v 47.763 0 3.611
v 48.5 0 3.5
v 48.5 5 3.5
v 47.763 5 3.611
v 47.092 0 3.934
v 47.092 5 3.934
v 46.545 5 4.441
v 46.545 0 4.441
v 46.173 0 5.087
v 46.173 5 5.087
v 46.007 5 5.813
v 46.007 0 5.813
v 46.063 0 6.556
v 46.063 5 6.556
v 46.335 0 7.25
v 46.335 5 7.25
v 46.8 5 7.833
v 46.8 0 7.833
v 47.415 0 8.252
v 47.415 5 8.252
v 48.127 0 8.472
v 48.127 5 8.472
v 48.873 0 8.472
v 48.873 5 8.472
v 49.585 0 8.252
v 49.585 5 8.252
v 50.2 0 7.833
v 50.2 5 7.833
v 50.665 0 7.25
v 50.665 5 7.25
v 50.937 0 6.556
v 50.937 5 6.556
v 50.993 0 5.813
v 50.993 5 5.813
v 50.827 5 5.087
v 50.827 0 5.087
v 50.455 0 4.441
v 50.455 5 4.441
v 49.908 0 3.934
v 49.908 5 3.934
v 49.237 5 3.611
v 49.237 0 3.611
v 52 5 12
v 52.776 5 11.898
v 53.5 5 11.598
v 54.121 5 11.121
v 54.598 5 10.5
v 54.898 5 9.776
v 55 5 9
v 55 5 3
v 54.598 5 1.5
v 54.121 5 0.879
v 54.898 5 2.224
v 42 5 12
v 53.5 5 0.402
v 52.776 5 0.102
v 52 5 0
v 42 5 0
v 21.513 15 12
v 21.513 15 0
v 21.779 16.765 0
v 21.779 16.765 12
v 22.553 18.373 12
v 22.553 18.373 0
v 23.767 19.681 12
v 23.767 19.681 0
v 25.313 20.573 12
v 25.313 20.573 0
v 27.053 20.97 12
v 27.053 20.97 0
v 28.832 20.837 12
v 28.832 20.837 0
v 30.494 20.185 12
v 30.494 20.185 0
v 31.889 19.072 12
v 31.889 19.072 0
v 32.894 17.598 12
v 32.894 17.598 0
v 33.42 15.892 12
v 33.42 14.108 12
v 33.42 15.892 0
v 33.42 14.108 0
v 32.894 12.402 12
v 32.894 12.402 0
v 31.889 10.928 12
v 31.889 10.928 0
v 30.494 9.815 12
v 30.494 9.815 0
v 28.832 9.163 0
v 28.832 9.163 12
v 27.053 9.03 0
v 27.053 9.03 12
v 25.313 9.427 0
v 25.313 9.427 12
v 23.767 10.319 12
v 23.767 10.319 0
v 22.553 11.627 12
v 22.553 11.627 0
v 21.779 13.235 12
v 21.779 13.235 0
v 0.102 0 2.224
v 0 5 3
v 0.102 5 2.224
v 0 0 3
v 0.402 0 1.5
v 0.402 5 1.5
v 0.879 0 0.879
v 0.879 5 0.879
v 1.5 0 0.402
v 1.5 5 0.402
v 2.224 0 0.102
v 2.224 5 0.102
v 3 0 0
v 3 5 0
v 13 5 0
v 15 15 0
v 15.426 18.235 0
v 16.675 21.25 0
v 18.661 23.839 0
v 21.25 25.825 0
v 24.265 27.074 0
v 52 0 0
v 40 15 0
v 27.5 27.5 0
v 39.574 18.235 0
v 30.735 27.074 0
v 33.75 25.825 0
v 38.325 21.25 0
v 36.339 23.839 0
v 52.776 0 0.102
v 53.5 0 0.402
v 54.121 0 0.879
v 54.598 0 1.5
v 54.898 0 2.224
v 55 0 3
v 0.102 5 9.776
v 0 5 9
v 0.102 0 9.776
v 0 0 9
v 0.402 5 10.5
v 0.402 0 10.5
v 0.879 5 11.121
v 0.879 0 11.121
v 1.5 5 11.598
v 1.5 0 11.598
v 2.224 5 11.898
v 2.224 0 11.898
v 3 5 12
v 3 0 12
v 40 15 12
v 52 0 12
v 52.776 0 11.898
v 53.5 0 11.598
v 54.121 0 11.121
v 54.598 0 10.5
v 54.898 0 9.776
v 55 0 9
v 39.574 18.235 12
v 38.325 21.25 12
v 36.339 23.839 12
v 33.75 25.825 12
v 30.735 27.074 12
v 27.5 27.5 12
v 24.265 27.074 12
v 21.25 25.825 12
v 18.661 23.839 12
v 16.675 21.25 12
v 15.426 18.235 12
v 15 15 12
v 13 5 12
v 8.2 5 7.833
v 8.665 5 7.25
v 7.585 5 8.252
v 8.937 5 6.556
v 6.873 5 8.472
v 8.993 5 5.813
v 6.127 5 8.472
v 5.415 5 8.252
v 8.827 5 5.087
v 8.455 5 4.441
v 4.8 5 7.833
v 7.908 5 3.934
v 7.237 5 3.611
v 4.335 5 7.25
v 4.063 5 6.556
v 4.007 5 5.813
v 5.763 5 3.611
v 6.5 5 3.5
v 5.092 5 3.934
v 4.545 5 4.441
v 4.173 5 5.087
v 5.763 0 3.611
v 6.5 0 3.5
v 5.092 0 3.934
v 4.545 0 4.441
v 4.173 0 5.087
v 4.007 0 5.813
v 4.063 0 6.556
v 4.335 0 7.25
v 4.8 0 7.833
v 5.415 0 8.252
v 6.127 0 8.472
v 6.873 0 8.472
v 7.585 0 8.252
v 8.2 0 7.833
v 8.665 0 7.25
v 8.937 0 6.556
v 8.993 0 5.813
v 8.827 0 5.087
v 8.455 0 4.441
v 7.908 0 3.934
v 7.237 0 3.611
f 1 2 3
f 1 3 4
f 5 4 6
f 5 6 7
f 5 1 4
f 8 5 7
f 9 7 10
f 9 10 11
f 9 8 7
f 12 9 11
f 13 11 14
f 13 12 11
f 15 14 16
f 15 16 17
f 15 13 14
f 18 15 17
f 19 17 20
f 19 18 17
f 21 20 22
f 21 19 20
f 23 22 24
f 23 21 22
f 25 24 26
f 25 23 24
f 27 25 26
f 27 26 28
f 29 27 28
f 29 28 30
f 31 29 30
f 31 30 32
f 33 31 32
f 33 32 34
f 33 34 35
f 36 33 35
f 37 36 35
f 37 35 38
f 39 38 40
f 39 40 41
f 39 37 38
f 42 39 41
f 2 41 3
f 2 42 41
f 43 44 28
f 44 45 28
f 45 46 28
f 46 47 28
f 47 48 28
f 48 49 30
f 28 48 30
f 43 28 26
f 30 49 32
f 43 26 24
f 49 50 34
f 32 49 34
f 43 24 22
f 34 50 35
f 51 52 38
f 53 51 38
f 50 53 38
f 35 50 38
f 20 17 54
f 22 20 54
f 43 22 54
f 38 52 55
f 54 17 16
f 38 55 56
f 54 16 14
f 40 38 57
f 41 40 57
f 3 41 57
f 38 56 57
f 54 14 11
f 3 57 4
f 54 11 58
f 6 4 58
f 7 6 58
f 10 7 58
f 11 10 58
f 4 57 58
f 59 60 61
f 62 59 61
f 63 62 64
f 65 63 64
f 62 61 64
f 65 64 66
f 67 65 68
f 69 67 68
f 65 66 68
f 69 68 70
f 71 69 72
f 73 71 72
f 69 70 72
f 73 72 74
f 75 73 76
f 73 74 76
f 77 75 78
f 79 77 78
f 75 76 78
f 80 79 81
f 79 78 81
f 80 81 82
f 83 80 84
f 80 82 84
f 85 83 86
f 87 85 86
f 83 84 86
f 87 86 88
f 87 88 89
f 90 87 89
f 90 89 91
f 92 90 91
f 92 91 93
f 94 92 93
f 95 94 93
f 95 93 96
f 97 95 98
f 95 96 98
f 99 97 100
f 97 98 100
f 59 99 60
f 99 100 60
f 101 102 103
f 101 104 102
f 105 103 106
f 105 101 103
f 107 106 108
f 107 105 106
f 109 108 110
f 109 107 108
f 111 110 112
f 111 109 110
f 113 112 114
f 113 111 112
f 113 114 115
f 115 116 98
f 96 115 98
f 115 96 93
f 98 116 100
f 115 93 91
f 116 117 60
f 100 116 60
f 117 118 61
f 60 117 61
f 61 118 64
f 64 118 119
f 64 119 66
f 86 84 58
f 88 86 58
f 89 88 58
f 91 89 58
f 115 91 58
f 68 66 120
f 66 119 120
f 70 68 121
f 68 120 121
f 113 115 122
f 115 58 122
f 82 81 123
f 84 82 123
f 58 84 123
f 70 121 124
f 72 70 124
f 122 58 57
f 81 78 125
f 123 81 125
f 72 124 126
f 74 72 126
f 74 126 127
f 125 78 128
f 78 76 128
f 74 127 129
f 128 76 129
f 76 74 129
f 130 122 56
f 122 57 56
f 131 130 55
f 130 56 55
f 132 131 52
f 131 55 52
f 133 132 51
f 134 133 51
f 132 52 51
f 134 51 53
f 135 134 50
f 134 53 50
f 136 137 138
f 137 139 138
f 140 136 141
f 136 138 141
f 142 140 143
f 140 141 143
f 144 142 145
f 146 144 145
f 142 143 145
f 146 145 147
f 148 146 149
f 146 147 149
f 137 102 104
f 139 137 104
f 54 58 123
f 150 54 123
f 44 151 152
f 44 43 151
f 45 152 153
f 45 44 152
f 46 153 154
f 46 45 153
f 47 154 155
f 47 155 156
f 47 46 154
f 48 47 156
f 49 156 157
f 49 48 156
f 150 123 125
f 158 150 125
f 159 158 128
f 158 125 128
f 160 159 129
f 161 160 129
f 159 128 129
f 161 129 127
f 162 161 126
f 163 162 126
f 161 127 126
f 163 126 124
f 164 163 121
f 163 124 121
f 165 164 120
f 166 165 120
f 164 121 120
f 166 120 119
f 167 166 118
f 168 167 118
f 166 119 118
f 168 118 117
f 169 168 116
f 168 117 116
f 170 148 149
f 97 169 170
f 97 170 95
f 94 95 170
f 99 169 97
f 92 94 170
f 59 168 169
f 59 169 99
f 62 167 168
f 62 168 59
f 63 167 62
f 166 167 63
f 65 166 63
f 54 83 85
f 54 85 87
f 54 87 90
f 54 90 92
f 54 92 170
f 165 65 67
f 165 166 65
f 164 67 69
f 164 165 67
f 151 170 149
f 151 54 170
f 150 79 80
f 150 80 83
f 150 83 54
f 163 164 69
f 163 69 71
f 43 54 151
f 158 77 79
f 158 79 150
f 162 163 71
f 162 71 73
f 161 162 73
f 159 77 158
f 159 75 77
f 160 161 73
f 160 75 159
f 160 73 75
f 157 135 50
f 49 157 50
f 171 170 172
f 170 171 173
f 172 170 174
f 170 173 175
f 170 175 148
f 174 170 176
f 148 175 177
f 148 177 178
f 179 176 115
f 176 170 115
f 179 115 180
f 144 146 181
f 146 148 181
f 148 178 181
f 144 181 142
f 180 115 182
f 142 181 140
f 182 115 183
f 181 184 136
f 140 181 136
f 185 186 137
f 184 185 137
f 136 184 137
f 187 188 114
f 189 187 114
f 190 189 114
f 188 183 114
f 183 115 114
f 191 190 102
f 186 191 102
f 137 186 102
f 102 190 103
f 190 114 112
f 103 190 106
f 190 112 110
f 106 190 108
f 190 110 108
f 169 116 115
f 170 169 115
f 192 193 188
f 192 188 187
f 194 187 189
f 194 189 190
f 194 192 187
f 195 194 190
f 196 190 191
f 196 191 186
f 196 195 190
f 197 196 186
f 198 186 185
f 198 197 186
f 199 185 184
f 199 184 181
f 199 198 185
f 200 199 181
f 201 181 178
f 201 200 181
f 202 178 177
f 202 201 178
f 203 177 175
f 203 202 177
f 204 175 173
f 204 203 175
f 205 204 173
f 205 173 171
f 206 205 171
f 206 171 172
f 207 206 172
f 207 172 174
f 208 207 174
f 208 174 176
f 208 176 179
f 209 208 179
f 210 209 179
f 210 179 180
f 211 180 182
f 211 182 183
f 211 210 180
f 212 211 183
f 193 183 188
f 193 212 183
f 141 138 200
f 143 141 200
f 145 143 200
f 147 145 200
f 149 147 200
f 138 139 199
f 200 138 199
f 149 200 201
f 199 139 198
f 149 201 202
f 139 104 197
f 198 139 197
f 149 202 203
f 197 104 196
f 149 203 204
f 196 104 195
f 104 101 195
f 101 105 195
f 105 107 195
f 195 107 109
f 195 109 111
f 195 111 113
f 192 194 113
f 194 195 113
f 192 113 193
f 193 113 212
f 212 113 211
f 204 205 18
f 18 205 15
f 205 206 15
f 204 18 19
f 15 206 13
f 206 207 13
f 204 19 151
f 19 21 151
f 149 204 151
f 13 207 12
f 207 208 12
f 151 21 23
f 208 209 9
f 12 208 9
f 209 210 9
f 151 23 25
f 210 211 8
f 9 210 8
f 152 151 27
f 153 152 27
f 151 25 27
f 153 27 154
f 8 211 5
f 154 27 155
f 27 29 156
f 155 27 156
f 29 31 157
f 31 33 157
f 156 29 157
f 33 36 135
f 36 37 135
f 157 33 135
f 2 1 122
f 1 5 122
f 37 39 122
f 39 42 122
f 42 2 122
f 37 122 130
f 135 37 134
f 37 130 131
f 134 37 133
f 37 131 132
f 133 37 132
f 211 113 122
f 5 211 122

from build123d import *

# Parameters (mm, degrees)
BOSS_EXTRUDE3_DEPTH = 12
SKETCH7_R           = 5.987031074
CUT_EXTRUDE1_DEPTH  = 12
SKETCH9_R           = 2.5
CUT_EXTRUDE2_DEPTH  = 5
FILLET2_R           = 3


with BuildPart() as part:
    # Sketch5 → Boss-Extrude3 (new body)
    with BuildSketch(Plane.XY):
        with BuildLine():
            Line((0, 0), (55, 0))
            Line((55, 0), (55, 5))
            Line((55, 5), (42, 5))
            Line((42, 5), (40, 15))
            ThreePointArc((40, 15), (27.5, 27.5), (15, 15))
            Line((15, 15), (13, 5))
            Line((13, 5), (0, 5))
            Line((0, 5), (0, 0))
        make_face()
    extrude(amount=BOSS_EXTRUDE3_DEPTH)

    # Sketch7 → Cut-Extrude1 (cut)
    with BuildSketch(Plane(origin=(0, 0, 0), x_dir=(-1, 0, 0), z_dir=(0, 0, -1))):
        with Locations((-27.5, 15)):
            Circle(SKETCH7_R)
    extrude(amount=-CUT_EXTRUDE1_DEPTH, mode=Mode.SUBTRACT)

    # Sketch9 → Cut-Extrude2 (cut)
    with BuildSketch(Plane(origin=(0, 0, 0), x_dir=(1, 0, 0), z_dir=(0, 1, 0))):
        with Locations(Location((6.5, -6, 0), (0, 0, 90))):
            Circle(SKETCH9_R)
        with Locations(Location((48.5, -6, 0), (0, 0, 90))):
            Circle(SKETCH9_R)
    extrude(amount=CUT_EXTRUDE2_DEPTH, mode=Mode.SUBTRACT)

    # Fillet2
    fillet2_edges = [part.edges().sort_by_distance(p)[0] for p in [
        (0, 2.5, 0),
        (0, 2.5, 12),
        (55, 2.5, 12),
        (55, 2.5, 0),
    ]]
    fillet(fillet2_edges, radius=FILLET2_R)


solid = part.part
